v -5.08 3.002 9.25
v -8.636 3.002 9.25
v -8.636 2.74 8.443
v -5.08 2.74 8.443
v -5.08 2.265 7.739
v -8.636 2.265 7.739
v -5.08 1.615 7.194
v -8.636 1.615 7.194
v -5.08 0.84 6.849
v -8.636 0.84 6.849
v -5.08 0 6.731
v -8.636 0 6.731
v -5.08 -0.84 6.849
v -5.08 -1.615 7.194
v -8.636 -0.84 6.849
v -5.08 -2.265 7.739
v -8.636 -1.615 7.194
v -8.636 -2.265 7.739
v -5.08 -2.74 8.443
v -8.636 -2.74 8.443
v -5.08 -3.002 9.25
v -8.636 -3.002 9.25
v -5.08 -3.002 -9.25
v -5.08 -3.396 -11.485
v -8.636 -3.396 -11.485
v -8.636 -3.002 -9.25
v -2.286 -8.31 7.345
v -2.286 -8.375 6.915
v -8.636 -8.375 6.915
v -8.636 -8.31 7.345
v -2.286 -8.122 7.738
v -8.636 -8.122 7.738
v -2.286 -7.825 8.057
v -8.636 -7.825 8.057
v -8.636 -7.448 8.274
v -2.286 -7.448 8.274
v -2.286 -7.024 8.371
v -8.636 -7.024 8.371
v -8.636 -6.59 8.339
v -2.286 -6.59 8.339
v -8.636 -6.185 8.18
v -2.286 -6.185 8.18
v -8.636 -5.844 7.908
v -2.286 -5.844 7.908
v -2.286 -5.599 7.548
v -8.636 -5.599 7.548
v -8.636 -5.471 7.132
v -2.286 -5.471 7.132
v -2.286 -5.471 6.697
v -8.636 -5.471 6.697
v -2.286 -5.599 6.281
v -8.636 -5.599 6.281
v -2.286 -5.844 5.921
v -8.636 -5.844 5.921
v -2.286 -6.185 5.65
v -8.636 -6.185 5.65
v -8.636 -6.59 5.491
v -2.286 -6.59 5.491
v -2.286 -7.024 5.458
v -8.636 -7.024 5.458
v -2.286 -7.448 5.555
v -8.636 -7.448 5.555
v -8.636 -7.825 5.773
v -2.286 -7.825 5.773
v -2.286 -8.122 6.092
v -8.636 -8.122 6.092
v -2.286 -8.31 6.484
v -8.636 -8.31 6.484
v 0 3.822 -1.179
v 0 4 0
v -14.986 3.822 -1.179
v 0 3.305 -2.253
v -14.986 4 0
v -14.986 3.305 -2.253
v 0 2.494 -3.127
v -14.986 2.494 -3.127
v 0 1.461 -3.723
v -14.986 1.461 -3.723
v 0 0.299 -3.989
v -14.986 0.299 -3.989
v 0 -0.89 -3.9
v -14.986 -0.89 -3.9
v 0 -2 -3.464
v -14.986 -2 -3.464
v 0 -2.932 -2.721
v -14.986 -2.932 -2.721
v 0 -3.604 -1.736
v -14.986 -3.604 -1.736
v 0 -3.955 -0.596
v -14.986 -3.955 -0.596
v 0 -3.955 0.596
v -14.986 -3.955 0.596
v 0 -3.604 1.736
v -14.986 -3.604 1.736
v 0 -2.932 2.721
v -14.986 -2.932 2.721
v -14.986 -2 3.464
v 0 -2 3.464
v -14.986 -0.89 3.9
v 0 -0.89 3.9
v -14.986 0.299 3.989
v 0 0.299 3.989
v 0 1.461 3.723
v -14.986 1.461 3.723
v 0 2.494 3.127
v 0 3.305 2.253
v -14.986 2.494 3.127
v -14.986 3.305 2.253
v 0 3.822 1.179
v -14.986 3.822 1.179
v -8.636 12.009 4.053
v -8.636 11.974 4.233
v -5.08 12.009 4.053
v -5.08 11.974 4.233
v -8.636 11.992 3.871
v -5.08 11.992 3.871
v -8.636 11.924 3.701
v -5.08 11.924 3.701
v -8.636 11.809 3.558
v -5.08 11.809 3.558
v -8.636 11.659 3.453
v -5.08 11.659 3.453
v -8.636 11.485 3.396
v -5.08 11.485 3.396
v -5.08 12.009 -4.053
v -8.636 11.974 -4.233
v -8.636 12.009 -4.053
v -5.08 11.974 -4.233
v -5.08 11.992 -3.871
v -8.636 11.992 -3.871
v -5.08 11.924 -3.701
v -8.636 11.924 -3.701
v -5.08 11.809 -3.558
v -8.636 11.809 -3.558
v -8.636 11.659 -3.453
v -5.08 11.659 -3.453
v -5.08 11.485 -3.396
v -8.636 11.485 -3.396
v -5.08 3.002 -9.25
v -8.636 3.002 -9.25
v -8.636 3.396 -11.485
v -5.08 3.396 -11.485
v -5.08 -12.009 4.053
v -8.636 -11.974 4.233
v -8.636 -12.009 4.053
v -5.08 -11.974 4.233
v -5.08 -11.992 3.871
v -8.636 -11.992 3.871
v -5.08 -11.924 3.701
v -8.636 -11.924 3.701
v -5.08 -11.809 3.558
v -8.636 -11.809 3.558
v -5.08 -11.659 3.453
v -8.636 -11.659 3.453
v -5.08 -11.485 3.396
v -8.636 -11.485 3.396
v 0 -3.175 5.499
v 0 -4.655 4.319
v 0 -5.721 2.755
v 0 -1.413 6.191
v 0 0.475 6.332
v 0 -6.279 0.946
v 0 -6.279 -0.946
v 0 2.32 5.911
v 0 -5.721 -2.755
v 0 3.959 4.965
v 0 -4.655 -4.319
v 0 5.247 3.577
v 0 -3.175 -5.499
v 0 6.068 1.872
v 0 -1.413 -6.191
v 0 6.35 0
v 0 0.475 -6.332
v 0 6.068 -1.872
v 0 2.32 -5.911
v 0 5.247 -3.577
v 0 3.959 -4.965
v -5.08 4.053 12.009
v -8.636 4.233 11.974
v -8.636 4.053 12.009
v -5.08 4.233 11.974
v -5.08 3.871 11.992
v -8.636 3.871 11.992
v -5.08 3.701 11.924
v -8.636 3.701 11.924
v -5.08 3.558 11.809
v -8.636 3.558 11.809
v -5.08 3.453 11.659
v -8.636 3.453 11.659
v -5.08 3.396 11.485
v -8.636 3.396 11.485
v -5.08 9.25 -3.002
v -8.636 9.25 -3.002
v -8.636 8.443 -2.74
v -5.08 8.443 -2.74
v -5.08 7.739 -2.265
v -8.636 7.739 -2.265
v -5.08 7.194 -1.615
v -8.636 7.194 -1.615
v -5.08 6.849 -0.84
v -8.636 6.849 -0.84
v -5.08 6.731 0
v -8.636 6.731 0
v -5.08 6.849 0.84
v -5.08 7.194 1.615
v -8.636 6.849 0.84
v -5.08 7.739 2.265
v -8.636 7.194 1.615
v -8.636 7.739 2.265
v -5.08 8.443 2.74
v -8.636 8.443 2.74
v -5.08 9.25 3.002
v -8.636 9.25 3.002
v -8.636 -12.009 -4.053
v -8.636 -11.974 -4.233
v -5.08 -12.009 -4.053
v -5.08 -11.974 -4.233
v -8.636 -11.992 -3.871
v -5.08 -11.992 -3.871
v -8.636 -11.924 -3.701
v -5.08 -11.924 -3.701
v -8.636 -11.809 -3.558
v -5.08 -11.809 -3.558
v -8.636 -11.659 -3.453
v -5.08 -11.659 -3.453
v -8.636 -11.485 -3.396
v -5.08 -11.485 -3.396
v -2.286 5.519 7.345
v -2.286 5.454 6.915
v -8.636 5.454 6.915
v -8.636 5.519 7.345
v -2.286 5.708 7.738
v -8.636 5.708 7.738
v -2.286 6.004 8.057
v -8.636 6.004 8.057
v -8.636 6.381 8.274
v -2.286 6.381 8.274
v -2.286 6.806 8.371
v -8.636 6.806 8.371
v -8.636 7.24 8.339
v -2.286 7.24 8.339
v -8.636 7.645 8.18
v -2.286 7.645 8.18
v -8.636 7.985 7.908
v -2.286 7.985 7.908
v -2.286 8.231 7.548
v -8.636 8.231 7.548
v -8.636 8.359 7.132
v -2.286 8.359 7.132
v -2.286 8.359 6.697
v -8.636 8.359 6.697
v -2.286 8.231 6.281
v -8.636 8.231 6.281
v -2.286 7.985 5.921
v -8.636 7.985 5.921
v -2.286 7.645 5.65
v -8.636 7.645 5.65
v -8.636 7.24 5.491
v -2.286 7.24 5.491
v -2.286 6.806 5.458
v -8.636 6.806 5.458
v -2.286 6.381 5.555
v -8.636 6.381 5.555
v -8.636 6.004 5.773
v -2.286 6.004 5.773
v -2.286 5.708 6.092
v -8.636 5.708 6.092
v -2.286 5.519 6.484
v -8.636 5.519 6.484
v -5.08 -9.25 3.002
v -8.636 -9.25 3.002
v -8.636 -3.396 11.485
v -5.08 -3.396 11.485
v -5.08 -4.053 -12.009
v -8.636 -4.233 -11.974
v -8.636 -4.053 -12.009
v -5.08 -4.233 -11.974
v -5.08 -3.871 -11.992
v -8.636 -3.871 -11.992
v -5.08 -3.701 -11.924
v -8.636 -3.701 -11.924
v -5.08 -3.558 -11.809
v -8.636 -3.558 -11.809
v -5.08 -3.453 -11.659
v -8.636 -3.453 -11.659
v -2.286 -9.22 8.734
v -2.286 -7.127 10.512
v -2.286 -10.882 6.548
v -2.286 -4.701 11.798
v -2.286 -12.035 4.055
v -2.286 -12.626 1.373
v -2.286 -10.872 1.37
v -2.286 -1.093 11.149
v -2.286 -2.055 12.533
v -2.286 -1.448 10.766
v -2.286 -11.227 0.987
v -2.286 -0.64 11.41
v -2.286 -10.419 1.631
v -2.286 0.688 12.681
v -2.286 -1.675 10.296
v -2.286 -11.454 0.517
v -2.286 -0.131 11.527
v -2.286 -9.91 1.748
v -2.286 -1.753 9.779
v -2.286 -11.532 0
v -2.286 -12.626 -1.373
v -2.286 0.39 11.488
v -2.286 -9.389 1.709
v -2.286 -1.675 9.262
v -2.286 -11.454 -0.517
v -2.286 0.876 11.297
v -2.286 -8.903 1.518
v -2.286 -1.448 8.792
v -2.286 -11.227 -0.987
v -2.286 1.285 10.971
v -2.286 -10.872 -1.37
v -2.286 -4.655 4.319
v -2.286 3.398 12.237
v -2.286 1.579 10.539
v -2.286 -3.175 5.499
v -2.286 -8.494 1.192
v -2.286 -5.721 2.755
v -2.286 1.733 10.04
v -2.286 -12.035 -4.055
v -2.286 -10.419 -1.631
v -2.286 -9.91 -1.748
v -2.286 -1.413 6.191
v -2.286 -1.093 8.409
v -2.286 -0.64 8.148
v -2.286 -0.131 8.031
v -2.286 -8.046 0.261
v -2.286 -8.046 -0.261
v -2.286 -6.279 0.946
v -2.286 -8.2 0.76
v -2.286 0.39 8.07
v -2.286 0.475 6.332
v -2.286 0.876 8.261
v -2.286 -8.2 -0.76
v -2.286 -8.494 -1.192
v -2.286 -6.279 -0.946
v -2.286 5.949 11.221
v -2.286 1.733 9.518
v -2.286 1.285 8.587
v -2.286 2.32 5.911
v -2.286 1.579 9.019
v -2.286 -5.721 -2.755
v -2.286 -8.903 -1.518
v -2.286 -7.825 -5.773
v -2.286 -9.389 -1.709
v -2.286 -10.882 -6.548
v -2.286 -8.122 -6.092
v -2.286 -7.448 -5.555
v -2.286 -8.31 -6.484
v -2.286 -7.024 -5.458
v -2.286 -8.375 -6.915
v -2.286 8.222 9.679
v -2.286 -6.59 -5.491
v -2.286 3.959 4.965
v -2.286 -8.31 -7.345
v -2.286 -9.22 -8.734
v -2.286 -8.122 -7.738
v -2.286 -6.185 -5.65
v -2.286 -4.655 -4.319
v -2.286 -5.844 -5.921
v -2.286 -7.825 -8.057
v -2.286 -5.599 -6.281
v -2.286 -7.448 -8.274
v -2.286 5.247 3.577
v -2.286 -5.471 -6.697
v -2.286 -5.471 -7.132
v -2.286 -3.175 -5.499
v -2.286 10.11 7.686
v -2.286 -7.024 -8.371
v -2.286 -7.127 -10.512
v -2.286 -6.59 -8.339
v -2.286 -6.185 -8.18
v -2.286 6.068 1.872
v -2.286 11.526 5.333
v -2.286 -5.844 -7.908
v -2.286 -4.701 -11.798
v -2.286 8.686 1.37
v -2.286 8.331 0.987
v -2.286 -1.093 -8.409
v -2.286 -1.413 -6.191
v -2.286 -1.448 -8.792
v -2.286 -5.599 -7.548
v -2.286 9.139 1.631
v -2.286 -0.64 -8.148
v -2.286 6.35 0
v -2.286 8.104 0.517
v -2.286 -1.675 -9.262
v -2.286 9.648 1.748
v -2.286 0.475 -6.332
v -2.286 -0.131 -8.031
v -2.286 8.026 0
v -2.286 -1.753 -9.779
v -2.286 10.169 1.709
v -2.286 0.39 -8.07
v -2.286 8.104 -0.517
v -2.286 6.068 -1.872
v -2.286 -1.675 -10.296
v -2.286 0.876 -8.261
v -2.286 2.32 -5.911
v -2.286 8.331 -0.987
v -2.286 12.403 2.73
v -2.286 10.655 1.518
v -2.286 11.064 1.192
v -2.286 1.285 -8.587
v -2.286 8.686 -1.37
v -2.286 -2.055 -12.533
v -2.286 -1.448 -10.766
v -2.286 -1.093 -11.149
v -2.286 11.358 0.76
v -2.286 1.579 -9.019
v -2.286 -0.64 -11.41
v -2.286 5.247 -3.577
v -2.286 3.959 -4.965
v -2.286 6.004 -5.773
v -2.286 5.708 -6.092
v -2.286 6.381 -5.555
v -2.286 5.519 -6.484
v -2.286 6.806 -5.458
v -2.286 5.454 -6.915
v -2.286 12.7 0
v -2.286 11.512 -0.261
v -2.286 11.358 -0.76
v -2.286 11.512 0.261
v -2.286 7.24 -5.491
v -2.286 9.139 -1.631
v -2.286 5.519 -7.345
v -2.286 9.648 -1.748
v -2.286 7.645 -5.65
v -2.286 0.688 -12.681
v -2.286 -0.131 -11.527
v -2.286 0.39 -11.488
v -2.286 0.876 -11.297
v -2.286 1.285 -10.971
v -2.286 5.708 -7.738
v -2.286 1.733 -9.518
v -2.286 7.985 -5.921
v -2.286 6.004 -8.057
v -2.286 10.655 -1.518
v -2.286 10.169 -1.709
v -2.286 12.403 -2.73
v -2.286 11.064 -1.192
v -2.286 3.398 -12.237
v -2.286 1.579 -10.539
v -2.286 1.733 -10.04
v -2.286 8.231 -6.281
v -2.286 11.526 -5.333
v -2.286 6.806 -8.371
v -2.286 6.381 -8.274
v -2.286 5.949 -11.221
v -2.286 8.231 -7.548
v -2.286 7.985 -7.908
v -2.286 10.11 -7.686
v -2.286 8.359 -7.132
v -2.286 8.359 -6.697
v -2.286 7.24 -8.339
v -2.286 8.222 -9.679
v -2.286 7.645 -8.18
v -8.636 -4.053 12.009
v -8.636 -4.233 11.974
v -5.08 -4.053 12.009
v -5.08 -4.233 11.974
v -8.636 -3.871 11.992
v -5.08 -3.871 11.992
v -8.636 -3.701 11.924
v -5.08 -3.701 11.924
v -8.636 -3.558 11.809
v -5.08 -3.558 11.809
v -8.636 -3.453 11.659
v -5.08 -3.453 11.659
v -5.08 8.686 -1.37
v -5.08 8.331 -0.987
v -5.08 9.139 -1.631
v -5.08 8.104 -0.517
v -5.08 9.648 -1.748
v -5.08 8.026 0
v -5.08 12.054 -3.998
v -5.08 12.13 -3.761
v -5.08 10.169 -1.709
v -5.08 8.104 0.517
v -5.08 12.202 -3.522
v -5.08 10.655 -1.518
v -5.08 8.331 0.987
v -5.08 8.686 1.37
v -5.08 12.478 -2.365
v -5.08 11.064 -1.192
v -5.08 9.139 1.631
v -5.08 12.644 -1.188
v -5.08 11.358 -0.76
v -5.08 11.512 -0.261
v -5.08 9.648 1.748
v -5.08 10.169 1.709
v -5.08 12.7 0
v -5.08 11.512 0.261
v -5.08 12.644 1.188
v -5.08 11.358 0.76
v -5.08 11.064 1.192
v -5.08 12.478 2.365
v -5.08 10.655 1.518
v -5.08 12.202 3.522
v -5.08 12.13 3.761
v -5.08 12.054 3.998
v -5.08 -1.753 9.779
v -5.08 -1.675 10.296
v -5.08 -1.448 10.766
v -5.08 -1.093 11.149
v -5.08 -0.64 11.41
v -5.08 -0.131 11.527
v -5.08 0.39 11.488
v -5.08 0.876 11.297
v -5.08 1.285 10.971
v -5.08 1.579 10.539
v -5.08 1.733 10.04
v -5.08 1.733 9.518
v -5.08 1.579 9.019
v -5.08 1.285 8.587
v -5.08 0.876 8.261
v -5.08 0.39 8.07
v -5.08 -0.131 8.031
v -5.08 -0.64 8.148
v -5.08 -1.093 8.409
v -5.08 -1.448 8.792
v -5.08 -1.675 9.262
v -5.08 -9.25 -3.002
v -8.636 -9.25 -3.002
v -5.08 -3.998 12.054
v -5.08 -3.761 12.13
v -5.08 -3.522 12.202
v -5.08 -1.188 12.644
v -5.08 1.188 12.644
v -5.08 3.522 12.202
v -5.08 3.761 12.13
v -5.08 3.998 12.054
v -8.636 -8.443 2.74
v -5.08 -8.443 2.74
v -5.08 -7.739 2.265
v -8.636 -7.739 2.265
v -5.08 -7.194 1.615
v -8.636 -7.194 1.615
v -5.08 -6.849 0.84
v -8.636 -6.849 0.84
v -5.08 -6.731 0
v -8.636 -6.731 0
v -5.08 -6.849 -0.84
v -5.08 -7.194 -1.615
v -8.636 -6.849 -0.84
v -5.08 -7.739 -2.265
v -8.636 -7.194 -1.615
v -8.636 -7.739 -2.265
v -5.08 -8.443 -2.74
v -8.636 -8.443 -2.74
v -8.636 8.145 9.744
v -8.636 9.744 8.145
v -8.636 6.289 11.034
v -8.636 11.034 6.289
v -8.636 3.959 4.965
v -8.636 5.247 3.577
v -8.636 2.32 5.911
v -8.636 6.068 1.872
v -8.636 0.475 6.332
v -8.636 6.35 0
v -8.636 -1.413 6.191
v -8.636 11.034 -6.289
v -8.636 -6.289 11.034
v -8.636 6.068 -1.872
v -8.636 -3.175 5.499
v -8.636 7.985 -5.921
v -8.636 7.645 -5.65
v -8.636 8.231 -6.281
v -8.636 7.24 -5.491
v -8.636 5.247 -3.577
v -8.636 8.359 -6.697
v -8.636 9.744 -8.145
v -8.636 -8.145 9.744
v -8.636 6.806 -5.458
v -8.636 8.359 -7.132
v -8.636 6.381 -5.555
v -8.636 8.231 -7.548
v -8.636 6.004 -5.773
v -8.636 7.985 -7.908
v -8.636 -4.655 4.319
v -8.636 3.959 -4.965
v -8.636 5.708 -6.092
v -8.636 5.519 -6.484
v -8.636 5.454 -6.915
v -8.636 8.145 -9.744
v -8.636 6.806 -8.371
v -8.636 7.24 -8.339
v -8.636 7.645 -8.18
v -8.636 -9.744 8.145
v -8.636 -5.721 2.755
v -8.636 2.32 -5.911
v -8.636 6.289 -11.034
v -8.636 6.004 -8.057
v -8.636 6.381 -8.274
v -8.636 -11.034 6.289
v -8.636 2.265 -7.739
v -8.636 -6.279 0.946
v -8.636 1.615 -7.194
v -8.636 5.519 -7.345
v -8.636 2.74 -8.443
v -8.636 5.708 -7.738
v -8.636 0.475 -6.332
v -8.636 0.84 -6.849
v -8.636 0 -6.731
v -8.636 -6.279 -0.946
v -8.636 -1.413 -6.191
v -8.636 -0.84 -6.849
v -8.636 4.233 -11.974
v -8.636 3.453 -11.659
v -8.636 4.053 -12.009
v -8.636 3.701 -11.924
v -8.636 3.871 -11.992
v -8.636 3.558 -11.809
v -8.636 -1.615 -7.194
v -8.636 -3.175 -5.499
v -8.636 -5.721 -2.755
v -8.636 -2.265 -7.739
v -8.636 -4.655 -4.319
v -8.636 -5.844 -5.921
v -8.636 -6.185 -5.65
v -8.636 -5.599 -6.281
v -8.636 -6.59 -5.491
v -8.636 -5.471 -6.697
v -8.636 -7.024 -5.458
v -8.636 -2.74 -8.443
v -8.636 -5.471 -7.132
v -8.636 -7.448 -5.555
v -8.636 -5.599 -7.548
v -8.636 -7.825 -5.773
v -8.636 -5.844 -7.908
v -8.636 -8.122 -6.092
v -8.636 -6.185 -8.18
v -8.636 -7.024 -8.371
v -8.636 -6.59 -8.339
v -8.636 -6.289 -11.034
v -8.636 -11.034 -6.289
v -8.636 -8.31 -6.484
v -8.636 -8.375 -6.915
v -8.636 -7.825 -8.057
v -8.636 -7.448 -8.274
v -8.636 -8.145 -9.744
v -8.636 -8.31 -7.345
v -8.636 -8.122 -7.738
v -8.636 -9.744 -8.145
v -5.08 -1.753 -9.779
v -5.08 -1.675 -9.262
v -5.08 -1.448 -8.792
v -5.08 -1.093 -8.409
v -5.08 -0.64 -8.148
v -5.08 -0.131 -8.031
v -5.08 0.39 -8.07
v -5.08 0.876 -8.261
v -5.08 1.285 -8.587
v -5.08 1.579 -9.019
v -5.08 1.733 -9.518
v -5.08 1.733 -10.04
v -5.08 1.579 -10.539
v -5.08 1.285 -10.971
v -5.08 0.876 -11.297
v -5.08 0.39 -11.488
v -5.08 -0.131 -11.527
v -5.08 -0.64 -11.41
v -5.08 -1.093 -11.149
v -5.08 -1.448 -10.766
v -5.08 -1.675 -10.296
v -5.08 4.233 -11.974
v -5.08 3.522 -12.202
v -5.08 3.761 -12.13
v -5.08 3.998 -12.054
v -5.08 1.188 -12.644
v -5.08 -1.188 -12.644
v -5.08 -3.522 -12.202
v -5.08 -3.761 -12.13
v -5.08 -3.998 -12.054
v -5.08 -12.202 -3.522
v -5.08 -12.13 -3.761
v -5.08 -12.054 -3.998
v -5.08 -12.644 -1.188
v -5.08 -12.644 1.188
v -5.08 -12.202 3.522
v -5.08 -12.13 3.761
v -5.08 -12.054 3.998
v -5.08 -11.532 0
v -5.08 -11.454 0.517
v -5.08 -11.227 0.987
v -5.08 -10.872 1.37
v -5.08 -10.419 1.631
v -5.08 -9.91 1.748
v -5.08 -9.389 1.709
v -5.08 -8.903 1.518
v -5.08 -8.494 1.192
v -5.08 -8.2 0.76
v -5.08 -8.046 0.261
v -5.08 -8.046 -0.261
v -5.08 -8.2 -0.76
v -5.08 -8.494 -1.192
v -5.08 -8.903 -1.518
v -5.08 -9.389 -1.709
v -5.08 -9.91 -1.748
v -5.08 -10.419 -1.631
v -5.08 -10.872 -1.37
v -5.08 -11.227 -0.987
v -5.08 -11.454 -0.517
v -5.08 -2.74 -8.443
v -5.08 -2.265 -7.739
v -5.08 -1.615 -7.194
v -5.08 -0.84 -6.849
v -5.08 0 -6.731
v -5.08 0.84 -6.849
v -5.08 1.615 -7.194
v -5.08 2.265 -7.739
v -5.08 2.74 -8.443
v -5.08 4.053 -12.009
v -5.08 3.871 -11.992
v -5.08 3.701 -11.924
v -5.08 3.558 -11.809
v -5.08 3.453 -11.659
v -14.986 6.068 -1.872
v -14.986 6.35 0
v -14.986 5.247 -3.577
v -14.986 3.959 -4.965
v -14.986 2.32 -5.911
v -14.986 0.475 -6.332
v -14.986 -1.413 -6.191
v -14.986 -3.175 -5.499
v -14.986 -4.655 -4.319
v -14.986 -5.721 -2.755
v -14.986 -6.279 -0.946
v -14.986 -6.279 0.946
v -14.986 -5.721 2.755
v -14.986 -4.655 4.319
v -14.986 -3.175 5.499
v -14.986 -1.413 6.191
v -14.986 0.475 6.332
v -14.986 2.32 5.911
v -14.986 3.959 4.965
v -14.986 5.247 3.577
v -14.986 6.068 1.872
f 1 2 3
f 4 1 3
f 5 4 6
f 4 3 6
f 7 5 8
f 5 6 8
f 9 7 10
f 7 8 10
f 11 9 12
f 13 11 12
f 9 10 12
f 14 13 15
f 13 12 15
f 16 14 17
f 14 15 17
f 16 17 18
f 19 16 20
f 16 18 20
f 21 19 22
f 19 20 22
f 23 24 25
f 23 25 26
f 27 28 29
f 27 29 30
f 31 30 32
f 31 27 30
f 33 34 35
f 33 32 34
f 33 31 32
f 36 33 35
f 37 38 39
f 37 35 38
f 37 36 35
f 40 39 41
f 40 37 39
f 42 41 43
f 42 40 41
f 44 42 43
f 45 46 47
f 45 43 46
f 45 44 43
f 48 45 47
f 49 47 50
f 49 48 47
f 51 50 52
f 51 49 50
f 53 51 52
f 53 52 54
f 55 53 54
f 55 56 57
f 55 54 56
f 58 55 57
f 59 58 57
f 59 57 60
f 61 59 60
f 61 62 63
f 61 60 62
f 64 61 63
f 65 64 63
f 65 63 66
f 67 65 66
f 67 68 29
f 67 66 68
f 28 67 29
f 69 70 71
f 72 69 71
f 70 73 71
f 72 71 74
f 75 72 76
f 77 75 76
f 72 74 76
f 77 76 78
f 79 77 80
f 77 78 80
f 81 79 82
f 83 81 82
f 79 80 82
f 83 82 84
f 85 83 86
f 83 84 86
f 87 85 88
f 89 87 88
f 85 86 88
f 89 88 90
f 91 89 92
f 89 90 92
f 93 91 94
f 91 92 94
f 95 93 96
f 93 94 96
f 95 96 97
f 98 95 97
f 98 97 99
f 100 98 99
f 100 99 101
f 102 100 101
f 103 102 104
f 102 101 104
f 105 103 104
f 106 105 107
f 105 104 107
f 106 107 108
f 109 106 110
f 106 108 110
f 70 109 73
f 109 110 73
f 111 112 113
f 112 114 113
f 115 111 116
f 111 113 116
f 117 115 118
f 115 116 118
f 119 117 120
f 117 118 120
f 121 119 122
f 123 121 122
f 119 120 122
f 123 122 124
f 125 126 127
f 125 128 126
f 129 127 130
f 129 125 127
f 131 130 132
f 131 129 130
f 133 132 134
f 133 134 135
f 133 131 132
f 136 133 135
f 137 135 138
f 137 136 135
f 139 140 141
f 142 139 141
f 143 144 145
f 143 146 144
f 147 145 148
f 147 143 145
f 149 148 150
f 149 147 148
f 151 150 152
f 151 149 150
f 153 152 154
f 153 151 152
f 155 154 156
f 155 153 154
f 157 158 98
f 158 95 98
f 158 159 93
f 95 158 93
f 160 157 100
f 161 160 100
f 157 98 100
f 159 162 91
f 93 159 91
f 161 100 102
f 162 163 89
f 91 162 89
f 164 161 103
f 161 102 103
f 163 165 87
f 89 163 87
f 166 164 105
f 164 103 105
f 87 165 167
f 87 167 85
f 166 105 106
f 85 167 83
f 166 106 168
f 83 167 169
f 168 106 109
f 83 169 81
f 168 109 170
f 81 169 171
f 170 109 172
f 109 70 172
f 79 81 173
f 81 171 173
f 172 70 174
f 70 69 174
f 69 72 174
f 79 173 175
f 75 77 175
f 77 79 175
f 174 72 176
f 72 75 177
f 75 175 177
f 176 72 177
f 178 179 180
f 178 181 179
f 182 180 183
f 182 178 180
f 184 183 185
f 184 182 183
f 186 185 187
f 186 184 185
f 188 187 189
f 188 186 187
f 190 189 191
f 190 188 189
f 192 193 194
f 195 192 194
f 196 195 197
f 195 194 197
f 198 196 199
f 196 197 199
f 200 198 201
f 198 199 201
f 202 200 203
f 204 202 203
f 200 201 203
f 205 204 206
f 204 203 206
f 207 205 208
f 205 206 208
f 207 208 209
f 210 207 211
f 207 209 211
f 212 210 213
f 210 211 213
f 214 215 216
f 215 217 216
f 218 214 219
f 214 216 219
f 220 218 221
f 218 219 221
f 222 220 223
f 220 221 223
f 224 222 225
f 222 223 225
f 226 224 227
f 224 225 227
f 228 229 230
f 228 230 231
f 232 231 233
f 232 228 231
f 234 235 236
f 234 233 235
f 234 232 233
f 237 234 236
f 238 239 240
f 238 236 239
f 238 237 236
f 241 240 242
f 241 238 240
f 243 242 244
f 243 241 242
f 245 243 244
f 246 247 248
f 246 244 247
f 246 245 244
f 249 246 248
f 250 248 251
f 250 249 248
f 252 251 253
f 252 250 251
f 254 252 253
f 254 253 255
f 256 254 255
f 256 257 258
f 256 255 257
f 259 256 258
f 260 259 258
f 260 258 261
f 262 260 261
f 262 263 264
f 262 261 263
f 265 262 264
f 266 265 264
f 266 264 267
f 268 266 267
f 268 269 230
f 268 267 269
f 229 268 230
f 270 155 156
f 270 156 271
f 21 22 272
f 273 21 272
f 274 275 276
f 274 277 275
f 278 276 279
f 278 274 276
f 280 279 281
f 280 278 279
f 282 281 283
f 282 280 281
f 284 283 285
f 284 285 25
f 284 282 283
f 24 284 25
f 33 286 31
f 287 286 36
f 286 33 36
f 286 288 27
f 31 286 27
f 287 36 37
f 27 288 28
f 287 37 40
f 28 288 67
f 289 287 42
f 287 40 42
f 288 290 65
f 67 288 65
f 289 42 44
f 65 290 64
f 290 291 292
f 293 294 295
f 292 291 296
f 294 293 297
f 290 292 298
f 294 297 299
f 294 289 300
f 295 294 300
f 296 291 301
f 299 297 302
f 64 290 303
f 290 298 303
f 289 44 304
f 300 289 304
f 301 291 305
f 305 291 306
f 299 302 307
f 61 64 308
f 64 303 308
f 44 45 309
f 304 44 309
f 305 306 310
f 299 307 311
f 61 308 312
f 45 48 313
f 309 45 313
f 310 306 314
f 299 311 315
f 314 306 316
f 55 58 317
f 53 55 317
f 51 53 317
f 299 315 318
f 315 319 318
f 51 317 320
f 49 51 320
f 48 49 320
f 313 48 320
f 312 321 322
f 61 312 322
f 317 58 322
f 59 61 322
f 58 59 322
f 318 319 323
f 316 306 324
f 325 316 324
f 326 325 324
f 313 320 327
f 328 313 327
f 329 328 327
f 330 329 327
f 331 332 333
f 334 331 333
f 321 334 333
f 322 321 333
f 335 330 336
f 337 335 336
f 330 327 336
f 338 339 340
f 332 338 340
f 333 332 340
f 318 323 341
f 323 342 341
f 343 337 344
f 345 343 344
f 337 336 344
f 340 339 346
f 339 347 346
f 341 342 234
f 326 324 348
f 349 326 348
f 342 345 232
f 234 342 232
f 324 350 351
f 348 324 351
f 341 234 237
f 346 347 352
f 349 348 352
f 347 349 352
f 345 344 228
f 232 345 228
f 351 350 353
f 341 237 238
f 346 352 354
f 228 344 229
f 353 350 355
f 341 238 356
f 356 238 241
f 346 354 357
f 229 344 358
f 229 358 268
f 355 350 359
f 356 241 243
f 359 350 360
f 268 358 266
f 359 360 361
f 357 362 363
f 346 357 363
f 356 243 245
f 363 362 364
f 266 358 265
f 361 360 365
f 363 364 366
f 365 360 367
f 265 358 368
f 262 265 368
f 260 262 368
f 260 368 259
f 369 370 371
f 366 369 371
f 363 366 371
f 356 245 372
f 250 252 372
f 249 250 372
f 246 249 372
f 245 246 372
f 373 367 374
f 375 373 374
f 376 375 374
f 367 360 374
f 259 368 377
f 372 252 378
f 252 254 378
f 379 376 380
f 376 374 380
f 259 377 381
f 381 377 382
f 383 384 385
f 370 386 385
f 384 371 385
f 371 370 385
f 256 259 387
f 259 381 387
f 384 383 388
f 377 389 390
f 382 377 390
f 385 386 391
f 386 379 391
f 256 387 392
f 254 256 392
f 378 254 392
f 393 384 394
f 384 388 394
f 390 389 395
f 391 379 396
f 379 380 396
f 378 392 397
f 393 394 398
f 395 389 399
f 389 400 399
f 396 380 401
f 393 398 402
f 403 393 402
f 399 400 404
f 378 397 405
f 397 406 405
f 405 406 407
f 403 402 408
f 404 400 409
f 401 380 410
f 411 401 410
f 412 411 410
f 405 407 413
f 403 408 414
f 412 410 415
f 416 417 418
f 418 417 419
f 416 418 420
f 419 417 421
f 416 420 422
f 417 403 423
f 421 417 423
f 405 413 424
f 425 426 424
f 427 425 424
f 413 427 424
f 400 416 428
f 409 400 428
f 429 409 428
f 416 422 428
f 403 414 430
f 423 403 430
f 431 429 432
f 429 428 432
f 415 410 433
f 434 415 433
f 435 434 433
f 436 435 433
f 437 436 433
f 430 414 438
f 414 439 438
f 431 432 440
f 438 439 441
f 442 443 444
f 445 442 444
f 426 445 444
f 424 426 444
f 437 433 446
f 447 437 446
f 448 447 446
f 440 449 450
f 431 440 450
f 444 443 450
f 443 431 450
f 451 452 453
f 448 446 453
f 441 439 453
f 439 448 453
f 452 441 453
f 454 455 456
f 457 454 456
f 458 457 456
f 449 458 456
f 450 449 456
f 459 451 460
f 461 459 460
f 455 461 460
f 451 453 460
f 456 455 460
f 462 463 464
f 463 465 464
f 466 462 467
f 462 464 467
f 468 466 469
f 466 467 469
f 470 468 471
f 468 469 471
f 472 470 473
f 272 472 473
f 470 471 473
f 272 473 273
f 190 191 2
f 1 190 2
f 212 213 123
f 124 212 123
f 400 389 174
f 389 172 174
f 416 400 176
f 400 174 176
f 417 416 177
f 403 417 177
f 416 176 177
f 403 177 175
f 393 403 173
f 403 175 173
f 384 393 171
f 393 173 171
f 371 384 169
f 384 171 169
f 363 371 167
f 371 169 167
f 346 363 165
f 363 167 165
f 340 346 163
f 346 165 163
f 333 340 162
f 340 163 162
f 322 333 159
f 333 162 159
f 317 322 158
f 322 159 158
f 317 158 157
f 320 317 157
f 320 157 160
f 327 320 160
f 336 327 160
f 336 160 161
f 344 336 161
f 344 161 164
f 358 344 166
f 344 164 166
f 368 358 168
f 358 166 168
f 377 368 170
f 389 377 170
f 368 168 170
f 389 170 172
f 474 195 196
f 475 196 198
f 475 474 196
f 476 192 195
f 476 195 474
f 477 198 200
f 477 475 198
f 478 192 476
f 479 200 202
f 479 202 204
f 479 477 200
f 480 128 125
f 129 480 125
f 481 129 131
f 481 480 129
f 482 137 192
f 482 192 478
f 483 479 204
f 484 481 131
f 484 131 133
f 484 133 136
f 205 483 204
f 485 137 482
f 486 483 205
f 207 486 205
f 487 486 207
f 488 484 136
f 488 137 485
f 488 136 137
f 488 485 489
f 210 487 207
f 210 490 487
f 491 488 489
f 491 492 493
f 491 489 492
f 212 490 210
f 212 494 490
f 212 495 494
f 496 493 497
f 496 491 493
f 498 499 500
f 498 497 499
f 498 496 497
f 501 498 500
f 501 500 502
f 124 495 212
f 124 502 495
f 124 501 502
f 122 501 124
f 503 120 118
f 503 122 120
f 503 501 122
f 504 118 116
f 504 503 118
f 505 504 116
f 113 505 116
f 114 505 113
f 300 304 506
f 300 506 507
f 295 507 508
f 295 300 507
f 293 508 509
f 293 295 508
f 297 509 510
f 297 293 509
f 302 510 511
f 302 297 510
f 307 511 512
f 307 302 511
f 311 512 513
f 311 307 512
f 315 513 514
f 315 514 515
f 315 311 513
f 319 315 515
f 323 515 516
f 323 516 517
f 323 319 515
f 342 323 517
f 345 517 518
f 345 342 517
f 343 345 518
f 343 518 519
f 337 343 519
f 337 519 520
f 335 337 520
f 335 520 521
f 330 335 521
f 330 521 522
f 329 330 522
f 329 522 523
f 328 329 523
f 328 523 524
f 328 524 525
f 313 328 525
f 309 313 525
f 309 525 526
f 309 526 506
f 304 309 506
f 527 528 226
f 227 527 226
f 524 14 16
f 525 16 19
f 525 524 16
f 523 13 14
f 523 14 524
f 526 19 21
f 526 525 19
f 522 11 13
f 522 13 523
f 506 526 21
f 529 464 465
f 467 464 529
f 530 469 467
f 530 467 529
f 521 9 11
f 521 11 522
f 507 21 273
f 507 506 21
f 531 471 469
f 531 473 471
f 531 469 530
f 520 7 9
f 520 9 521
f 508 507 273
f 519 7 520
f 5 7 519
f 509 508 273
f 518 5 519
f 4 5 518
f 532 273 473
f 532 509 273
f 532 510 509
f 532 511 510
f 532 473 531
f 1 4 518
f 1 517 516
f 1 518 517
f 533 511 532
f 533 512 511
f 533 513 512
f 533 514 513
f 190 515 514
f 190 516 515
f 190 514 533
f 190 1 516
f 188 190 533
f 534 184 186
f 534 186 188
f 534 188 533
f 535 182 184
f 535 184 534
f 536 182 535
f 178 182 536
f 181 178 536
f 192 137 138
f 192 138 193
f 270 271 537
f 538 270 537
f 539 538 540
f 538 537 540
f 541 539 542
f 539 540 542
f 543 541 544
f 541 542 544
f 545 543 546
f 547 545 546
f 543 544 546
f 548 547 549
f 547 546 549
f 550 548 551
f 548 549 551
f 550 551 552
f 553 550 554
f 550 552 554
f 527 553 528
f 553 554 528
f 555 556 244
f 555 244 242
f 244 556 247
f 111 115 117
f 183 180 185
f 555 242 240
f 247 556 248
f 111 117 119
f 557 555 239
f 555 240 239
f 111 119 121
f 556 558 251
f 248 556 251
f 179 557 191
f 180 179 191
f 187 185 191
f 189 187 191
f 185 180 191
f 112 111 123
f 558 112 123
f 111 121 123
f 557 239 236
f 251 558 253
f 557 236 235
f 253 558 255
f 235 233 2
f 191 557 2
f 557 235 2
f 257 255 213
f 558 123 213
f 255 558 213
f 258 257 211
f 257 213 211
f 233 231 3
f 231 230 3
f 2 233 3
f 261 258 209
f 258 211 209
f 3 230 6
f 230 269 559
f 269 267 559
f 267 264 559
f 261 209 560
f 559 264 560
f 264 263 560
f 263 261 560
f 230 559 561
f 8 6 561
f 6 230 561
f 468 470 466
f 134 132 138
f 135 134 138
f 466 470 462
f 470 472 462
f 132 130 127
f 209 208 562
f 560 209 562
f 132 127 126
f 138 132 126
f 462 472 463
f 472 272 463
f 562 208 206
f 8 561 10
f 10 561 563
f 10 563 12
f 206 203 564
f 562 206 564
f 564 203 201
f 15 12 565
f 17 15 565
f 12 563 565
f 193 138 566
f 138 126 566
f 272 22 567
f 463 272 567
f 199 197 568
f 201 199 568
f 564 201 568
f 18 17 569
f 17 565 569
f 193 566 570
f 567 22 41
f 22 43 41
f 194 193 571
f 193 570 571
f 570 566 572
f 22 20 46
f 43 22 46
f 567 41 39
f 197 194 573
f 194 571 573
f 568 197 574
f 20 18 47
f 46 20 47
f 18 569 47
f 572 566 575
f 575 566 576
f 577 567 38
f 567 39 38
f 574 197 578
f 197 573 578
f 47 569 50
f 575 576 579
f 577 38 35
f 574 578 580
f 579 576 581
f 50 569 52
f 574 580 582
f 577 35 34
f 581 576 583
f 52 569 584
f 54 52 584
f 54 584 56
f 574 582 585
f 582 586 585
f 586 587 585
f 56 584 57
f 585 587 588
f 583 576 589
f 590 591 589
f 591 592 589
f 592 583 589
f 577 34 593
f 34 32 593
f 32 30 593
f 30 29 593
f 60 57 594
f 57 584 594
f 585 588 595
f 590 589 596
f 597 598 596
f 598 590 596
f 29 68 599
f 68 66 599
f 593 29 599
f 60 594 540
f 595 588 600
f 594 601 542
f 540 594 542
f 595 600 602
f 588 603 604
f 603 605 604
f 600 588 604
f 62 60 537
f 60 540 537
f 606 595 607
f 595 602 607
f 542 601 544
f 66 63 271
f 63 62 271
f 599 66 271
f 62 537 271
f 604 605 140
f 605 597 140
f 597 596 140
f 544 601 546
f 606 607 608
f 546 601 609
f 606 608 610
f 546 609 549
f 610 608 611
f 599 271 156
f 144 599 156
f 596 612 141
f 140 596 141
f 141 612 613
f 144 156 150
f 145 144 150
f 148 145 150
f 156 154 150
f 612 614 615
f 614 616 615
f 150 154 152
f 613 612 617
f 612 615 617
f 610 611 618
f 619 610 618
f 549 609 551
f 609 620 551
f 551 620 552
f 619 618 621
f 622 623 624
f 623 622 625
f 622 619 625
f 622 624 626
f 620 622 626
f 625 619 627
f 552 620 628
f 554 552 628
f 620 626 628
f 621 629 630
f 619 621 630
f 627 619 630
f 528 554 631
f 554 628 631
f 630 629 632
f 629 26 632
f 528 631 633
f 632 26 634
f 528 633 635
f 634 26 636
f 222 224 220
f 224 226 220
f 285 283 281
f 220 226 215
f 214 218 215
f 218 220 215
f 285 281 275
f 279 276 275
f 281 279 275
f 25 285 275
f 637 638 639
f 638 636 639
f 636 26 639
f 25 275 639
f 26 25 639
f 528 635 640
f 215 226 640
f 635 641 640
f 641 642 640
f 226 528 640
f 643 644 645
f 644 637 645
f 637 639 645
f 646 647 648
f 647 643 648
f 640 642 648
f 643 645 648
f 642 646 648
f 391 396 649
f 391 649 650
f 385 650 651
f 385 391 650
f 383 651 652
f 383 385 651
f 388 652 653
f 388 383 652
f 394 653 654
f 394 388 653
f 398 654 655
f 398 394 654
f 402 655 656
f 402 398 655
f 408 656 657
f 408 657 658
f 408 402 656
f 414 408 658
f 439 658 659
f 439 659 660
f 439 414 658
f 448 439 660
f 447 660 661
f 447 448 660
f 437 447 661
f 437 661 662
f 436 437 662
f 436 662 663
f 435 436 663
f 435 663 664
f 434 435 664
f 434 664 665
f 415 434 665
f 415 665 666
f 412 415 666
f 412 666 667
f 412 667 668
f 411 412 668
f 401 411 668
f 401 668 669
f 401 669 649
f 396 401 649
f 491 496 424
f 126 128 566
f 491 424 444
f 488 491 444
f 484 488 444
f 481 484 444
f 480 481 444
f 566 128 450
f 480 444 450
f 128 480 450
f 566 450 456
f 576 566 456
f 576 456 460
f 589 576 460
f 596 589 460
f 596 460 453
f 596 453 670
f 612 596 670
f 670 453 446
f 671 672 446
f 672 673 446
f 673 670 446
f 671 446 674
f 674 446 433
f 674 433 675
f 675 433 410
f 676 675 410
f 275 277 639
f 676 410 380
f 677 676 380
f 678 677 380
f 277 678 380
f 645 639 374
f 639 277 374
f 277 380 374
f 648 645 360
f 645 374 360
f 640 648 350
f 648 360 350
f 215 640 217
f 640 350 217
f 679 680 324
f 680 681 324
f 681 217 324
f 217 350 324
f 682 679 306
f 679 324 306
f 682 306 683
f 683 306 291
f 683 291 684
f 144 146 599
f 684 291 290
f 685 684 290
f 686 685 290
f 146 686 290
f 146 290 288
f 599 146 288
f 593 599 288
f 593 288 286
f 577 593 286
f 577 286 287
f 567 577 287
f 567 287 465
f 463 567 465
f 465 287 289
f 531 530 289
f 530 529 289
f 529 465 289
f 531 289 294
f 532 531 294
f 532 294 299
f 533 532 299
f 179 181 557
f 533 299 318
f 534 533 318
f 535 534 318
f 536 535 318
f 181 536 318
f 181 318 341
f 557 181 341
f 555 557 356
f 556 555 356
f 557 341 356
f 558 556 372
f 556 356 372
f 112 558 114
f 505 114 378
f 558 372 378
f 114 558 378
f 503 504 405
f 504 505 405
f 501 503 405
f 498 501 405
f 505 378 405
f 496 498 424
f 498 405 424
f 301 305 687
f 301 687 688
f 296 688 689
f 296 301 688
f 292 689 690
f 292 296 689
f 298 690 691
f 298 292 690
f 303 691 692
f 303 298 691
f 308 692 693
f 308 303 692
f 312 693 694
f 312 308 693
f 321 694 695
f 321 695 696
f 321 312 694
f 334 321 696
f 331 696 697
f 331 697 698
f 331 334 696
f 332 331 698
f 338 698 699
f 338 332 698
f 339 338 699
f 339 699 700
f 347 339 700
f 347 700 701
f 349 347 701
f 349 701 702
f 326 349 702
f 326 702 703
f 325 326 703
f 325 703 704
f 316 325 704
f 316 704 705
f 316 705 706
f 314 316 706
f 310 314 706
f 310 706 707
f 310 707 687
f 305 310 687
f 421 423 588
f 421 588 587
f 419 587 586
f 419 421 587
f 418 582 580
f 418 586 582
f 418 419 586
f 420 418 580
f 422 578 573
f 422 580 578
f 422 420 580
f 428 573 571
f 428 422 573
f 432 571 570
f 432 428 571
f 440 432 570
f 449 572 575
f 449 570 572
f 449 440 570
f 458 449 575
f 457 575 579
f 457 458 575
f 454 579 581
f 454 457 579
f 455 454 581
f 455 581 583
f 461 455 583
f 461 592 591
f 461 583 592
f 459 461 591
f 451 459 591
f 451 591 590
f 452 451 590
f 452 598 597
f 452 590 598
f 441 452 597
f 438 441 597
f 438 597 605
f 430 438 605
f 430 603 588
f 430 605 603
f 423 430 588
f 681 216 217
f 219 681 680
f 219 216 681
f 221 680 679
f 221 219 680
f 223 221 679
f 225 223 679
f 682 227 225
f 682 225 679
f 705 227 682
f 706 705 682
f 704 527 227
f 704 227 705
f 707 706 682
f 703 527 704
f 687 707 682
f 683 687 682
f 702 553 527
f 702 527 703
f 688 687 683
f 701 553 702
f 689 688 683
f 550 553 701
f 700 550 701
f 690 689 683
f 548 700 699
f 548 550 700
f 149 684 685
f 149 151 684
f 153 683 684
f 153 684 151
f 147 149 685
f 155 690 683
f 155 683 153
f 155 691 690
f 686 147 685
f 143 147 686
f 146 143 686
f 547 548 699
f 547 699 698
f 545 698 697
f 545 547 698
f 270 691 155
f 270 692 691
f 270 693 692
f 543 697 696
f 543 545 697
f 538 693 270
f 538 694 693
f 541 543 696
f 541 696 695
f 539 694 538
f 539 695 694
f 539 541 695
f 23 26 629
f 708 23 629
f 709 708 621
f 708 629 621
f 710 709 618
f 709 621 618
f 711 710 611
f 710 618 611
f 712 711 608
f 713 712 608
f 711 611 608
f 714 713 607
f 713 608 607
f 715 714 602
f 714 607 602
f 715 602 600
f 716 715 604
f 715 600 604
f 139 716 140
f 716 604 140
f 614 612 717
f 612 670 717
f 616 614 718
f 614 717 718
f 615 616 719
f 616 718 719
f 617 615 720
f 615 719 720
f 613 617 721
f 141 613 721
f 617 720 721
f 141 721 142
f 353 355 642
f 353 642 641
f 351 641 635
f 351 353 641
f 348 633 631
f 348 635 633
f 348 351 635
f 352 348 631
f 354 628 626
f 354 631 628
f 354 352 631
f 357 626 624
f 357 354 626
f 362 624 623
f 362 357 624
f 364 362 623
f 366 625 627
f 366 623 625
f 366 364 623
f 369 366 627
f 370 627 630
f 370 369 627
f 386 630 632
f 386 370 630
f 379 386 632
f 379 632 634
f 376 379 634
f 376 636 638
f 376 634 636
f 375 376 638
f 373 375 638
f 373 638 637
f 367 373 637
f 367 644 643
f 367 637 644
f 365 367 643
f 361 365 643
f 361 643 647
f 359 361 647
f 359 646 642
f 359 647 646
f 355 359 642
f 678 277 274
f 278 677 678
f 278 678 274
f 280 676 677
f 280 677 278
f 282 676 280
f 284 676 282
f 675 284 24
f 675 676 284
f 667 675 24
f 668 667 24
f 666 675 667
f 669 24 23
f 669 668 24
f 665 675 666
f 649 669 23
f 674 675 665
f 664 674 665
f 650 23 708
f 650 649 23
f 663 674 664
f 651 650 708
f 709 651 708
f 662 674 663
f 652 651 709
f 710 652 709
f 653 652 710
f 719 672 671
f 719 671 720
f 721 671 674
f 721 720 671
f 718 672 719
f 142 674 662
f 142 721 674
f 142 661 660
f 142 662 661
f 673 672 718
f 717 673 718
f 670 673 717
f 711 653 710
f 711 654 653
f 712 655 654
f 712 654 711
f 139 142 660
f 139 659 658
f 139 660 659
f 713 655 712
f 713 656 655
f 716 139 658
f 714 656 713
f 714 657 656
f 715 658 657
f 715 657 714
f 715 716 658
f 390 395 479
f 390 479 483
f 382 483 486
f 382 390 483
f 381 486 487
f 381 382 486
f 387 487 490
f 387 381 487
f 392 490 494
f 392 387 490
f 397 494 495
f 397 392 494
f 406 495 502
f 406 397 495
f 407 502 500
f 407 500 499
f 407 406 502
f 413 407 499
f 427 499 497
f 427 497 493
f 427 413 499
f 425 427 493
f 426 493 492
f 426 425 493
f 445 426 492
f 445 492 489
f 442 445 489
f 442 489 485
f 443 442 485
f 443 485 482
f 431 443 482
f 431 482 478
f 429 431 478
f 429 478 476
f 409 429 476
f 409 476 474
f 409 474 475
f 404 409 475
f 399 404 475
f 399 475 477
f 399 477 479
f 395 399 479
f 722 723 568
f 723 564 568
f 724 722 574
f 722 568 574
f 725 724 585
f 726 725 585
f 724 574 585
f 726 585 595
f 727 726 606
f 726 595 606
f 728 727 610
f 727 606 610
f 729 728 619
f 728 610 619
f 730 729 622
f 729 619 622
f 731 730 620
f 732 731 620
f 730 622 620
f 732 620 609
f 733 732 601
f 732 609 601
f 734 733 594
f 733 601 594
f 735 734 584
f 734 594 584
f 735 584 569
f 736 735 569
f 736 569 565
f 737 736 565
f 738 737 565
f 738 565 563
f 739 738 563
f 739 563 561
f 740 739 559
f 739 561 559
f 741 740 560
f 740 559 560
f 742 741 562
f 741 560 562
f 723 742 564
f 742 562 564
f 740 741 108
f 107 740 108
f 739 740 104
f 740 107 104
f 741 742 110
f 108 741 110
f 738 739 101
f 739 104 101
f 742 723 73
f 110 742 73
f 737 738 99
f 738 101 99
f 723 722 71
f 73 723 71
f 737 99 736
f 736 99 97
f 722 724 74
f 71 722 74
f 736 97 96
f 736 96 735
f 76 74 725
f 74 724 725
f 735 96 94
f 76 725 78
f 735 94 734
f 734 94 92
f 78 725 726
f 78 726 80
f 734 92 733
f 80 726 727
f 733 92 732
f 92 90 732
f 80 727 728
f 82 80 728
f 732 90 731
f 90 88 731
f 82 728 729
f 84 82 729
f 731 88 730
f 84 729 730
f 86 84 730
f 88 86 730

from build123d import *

# Parameters (mm, degrees)
CUT_EXTRUDE2_DEPTH      = 20.92888597
CUT_EXTRUDE2_DEPTH_BACK = 20.92888597
SKETCH2_3_R             = 1.7526
SKETCH2_3_R_2           = 1.4605
SKETCH2_R               = 1.7526
CUT_EXTRUDE1_DEPTH      = 3.556
FILLET1_R               = 0.635


with BuildPart() as part:
    # Sketch1 → Revolve1 (revolve)
    with BuildSketch(Plane.XY):
        Polygon((-14.986, 6.35), (-8.636, 6.35), (-8.636, 12.7), (-2.286, 12.7), (-2.286, 6.35), (0, 6.35), (0, 4), (-14.986, 4), align=None)
    revolve(axis=Axis((0, 0, 0), (-1, 0, 0)))

    # Sketch2<3> → Cut-Extrude2 (cut, two sides: drawn at the far end of the back side and taken through both)
    with BuildSketch(Plane.ZY.offset(8.636).offset(-CUT_EXTRUDE2_DEPTH_BACK)):
        with Locations((-9.779, 0)):
            Circle(SKETCH2_3_R)
        with Locations((0, 9.779)):
            Circle(SKETCH2_3_R)
        with Locations((9.779, 0)):
            Circle(SKETCH2_3_R)
        with Locations((0, -9.779)):
            Circle(SKETCH2_3_R)
        with Locations((-6.914797213, 6.914797213)):
            Circle(SKETCH2_3_R_2)
        with Locations((6.914797213, 6.914797213)):
            Circle(SKETCH2_3_R_2)
        with Locations((6.914797213, -6.914797213)):
            Circle(SKETCH2_3_R_2)
        with Locations((-6.914797213, -6.914797213)):
            Circle(SKETCH2_3_R_2)
    extrude(amount=CUT_EXTRUDE2_DEPTH + CUT_EXTRUDE2_DEPTH_BACK, mode=Mode.SUBTRACT)

    # Sketch2 → Cut-Extrude1 (cut)
    # profile 1 of 4: a face of its own
    with BuildSketch(Plane.ZY.offset(8.636)):
        with BuildLine():
            Line((-12.201800216, -3.52222536), (-9.249720354, -3.001694031))
            ThreePointArc((-9.249720354, -3.001694031), (-6.731, 0), (-9.249720354, 3.001694031))
            Line((-9.249720354, 3.001694031), (-12.201800216, 3.52222536))
            ThreePointArc((-12.201800216, 3.52222536), (-12.7, 0), (-12.201800216, -3.52222536))
        make_face()
        with Locations((-9.779, 0)):
            Circle(SKETCH2_R, mode=Mode.SUBTRACT)
    # profile 2 of 4: a face of its own
    with BuildSketch(Plane.ZY.offset(8.636)):
        with BuildLine():
            Line((-3.001694031, -9.249720354), (-3.52222536, -12.201800216))
            ThreePointArc((-3.52222536, -12.201800216), (0, -12.7), (3.52222536, -12.201800216))
            Line((3.52222536, -12.201800216), (3.001694031, -9.249720354))
            ThreePointArc((3.001694031, -9.249720354), (0, -6.731), (-3.001694031, -9.249720354))
        make_face()
        with Locations((0, -9.779)):
            Circle(SKETCH2_R, mode=Mode.SUBTRACT)
    # profile 3 of 4: a face of its own
    with BuildSketch(Plane.ZY.offset(8.636)):
        with BuildLine():
            ThreePointArc((3.52222536, 12.201800216), (0, 12.7), (-3.52222536, 12.201800216))
            Line((-3.52222536, 12.201800216), (-3.001694031, 9.249720354))
            ThreePointArc((-3.001694031, 9.249720354), (0, 6.731), (3.001694031, 9.249720354))
            Line((3.001694031, 9.249720354), (3.52222536, 12.201800216))
        make_face()
        with Locations((0, 9.779)):
            Circle(SKETCH2_R, mode=Mode.SUBTRACT)
    # profile 4 of 4: a face of its own
    with BuildSketch(Plane.ZY.offset(8.636)):
        with BuildLine():
            Line((9.249720354, -3.001694031), (12.201800216, -3.52222536))
            ThreePointArc((12.201800216, -3.52222536), (12.7, 0), (12.201800216, 3.52222536))
            Line((12.201800216, 3.52222536), (9.249720354, 3.001694031))
            ThreePointArc((9.249720354, 3.001694031), (6.731, 0), (9.249720354, -3.001694031))
        make_face()
        with Locations((9.779, 0)):
            Circle(SKETCH2_R, mode=Mode.SUBTRACT)
    extrude(amount=-CUT_EXTRUDE1_DEPTH, mode=Mode.SUBTRACT)

    # Fillet1
    fillet1_edges = [part.edges().sort_by_distance(p)[0] for p in [
        (-6.858, 12.201800216, -3.52222536),
        (-6.858, 12.201800216, 3.52222536),
        (-6.858, 3.52222536, 12.201800216),
        (-6.858, -3.52222536, 12.201800216),
        (-6.858, -12.201800216, 3.52222536),
        (-6.858, -12.201800216, -3.52222536),
        (-6.858, -3.52222536, -12.201800216),
        (-6.858, 3.52222536, -12.201800216),
    ]]
    fillet(fillet1_edges, radius=FILLET1_R)


solid = part.part
